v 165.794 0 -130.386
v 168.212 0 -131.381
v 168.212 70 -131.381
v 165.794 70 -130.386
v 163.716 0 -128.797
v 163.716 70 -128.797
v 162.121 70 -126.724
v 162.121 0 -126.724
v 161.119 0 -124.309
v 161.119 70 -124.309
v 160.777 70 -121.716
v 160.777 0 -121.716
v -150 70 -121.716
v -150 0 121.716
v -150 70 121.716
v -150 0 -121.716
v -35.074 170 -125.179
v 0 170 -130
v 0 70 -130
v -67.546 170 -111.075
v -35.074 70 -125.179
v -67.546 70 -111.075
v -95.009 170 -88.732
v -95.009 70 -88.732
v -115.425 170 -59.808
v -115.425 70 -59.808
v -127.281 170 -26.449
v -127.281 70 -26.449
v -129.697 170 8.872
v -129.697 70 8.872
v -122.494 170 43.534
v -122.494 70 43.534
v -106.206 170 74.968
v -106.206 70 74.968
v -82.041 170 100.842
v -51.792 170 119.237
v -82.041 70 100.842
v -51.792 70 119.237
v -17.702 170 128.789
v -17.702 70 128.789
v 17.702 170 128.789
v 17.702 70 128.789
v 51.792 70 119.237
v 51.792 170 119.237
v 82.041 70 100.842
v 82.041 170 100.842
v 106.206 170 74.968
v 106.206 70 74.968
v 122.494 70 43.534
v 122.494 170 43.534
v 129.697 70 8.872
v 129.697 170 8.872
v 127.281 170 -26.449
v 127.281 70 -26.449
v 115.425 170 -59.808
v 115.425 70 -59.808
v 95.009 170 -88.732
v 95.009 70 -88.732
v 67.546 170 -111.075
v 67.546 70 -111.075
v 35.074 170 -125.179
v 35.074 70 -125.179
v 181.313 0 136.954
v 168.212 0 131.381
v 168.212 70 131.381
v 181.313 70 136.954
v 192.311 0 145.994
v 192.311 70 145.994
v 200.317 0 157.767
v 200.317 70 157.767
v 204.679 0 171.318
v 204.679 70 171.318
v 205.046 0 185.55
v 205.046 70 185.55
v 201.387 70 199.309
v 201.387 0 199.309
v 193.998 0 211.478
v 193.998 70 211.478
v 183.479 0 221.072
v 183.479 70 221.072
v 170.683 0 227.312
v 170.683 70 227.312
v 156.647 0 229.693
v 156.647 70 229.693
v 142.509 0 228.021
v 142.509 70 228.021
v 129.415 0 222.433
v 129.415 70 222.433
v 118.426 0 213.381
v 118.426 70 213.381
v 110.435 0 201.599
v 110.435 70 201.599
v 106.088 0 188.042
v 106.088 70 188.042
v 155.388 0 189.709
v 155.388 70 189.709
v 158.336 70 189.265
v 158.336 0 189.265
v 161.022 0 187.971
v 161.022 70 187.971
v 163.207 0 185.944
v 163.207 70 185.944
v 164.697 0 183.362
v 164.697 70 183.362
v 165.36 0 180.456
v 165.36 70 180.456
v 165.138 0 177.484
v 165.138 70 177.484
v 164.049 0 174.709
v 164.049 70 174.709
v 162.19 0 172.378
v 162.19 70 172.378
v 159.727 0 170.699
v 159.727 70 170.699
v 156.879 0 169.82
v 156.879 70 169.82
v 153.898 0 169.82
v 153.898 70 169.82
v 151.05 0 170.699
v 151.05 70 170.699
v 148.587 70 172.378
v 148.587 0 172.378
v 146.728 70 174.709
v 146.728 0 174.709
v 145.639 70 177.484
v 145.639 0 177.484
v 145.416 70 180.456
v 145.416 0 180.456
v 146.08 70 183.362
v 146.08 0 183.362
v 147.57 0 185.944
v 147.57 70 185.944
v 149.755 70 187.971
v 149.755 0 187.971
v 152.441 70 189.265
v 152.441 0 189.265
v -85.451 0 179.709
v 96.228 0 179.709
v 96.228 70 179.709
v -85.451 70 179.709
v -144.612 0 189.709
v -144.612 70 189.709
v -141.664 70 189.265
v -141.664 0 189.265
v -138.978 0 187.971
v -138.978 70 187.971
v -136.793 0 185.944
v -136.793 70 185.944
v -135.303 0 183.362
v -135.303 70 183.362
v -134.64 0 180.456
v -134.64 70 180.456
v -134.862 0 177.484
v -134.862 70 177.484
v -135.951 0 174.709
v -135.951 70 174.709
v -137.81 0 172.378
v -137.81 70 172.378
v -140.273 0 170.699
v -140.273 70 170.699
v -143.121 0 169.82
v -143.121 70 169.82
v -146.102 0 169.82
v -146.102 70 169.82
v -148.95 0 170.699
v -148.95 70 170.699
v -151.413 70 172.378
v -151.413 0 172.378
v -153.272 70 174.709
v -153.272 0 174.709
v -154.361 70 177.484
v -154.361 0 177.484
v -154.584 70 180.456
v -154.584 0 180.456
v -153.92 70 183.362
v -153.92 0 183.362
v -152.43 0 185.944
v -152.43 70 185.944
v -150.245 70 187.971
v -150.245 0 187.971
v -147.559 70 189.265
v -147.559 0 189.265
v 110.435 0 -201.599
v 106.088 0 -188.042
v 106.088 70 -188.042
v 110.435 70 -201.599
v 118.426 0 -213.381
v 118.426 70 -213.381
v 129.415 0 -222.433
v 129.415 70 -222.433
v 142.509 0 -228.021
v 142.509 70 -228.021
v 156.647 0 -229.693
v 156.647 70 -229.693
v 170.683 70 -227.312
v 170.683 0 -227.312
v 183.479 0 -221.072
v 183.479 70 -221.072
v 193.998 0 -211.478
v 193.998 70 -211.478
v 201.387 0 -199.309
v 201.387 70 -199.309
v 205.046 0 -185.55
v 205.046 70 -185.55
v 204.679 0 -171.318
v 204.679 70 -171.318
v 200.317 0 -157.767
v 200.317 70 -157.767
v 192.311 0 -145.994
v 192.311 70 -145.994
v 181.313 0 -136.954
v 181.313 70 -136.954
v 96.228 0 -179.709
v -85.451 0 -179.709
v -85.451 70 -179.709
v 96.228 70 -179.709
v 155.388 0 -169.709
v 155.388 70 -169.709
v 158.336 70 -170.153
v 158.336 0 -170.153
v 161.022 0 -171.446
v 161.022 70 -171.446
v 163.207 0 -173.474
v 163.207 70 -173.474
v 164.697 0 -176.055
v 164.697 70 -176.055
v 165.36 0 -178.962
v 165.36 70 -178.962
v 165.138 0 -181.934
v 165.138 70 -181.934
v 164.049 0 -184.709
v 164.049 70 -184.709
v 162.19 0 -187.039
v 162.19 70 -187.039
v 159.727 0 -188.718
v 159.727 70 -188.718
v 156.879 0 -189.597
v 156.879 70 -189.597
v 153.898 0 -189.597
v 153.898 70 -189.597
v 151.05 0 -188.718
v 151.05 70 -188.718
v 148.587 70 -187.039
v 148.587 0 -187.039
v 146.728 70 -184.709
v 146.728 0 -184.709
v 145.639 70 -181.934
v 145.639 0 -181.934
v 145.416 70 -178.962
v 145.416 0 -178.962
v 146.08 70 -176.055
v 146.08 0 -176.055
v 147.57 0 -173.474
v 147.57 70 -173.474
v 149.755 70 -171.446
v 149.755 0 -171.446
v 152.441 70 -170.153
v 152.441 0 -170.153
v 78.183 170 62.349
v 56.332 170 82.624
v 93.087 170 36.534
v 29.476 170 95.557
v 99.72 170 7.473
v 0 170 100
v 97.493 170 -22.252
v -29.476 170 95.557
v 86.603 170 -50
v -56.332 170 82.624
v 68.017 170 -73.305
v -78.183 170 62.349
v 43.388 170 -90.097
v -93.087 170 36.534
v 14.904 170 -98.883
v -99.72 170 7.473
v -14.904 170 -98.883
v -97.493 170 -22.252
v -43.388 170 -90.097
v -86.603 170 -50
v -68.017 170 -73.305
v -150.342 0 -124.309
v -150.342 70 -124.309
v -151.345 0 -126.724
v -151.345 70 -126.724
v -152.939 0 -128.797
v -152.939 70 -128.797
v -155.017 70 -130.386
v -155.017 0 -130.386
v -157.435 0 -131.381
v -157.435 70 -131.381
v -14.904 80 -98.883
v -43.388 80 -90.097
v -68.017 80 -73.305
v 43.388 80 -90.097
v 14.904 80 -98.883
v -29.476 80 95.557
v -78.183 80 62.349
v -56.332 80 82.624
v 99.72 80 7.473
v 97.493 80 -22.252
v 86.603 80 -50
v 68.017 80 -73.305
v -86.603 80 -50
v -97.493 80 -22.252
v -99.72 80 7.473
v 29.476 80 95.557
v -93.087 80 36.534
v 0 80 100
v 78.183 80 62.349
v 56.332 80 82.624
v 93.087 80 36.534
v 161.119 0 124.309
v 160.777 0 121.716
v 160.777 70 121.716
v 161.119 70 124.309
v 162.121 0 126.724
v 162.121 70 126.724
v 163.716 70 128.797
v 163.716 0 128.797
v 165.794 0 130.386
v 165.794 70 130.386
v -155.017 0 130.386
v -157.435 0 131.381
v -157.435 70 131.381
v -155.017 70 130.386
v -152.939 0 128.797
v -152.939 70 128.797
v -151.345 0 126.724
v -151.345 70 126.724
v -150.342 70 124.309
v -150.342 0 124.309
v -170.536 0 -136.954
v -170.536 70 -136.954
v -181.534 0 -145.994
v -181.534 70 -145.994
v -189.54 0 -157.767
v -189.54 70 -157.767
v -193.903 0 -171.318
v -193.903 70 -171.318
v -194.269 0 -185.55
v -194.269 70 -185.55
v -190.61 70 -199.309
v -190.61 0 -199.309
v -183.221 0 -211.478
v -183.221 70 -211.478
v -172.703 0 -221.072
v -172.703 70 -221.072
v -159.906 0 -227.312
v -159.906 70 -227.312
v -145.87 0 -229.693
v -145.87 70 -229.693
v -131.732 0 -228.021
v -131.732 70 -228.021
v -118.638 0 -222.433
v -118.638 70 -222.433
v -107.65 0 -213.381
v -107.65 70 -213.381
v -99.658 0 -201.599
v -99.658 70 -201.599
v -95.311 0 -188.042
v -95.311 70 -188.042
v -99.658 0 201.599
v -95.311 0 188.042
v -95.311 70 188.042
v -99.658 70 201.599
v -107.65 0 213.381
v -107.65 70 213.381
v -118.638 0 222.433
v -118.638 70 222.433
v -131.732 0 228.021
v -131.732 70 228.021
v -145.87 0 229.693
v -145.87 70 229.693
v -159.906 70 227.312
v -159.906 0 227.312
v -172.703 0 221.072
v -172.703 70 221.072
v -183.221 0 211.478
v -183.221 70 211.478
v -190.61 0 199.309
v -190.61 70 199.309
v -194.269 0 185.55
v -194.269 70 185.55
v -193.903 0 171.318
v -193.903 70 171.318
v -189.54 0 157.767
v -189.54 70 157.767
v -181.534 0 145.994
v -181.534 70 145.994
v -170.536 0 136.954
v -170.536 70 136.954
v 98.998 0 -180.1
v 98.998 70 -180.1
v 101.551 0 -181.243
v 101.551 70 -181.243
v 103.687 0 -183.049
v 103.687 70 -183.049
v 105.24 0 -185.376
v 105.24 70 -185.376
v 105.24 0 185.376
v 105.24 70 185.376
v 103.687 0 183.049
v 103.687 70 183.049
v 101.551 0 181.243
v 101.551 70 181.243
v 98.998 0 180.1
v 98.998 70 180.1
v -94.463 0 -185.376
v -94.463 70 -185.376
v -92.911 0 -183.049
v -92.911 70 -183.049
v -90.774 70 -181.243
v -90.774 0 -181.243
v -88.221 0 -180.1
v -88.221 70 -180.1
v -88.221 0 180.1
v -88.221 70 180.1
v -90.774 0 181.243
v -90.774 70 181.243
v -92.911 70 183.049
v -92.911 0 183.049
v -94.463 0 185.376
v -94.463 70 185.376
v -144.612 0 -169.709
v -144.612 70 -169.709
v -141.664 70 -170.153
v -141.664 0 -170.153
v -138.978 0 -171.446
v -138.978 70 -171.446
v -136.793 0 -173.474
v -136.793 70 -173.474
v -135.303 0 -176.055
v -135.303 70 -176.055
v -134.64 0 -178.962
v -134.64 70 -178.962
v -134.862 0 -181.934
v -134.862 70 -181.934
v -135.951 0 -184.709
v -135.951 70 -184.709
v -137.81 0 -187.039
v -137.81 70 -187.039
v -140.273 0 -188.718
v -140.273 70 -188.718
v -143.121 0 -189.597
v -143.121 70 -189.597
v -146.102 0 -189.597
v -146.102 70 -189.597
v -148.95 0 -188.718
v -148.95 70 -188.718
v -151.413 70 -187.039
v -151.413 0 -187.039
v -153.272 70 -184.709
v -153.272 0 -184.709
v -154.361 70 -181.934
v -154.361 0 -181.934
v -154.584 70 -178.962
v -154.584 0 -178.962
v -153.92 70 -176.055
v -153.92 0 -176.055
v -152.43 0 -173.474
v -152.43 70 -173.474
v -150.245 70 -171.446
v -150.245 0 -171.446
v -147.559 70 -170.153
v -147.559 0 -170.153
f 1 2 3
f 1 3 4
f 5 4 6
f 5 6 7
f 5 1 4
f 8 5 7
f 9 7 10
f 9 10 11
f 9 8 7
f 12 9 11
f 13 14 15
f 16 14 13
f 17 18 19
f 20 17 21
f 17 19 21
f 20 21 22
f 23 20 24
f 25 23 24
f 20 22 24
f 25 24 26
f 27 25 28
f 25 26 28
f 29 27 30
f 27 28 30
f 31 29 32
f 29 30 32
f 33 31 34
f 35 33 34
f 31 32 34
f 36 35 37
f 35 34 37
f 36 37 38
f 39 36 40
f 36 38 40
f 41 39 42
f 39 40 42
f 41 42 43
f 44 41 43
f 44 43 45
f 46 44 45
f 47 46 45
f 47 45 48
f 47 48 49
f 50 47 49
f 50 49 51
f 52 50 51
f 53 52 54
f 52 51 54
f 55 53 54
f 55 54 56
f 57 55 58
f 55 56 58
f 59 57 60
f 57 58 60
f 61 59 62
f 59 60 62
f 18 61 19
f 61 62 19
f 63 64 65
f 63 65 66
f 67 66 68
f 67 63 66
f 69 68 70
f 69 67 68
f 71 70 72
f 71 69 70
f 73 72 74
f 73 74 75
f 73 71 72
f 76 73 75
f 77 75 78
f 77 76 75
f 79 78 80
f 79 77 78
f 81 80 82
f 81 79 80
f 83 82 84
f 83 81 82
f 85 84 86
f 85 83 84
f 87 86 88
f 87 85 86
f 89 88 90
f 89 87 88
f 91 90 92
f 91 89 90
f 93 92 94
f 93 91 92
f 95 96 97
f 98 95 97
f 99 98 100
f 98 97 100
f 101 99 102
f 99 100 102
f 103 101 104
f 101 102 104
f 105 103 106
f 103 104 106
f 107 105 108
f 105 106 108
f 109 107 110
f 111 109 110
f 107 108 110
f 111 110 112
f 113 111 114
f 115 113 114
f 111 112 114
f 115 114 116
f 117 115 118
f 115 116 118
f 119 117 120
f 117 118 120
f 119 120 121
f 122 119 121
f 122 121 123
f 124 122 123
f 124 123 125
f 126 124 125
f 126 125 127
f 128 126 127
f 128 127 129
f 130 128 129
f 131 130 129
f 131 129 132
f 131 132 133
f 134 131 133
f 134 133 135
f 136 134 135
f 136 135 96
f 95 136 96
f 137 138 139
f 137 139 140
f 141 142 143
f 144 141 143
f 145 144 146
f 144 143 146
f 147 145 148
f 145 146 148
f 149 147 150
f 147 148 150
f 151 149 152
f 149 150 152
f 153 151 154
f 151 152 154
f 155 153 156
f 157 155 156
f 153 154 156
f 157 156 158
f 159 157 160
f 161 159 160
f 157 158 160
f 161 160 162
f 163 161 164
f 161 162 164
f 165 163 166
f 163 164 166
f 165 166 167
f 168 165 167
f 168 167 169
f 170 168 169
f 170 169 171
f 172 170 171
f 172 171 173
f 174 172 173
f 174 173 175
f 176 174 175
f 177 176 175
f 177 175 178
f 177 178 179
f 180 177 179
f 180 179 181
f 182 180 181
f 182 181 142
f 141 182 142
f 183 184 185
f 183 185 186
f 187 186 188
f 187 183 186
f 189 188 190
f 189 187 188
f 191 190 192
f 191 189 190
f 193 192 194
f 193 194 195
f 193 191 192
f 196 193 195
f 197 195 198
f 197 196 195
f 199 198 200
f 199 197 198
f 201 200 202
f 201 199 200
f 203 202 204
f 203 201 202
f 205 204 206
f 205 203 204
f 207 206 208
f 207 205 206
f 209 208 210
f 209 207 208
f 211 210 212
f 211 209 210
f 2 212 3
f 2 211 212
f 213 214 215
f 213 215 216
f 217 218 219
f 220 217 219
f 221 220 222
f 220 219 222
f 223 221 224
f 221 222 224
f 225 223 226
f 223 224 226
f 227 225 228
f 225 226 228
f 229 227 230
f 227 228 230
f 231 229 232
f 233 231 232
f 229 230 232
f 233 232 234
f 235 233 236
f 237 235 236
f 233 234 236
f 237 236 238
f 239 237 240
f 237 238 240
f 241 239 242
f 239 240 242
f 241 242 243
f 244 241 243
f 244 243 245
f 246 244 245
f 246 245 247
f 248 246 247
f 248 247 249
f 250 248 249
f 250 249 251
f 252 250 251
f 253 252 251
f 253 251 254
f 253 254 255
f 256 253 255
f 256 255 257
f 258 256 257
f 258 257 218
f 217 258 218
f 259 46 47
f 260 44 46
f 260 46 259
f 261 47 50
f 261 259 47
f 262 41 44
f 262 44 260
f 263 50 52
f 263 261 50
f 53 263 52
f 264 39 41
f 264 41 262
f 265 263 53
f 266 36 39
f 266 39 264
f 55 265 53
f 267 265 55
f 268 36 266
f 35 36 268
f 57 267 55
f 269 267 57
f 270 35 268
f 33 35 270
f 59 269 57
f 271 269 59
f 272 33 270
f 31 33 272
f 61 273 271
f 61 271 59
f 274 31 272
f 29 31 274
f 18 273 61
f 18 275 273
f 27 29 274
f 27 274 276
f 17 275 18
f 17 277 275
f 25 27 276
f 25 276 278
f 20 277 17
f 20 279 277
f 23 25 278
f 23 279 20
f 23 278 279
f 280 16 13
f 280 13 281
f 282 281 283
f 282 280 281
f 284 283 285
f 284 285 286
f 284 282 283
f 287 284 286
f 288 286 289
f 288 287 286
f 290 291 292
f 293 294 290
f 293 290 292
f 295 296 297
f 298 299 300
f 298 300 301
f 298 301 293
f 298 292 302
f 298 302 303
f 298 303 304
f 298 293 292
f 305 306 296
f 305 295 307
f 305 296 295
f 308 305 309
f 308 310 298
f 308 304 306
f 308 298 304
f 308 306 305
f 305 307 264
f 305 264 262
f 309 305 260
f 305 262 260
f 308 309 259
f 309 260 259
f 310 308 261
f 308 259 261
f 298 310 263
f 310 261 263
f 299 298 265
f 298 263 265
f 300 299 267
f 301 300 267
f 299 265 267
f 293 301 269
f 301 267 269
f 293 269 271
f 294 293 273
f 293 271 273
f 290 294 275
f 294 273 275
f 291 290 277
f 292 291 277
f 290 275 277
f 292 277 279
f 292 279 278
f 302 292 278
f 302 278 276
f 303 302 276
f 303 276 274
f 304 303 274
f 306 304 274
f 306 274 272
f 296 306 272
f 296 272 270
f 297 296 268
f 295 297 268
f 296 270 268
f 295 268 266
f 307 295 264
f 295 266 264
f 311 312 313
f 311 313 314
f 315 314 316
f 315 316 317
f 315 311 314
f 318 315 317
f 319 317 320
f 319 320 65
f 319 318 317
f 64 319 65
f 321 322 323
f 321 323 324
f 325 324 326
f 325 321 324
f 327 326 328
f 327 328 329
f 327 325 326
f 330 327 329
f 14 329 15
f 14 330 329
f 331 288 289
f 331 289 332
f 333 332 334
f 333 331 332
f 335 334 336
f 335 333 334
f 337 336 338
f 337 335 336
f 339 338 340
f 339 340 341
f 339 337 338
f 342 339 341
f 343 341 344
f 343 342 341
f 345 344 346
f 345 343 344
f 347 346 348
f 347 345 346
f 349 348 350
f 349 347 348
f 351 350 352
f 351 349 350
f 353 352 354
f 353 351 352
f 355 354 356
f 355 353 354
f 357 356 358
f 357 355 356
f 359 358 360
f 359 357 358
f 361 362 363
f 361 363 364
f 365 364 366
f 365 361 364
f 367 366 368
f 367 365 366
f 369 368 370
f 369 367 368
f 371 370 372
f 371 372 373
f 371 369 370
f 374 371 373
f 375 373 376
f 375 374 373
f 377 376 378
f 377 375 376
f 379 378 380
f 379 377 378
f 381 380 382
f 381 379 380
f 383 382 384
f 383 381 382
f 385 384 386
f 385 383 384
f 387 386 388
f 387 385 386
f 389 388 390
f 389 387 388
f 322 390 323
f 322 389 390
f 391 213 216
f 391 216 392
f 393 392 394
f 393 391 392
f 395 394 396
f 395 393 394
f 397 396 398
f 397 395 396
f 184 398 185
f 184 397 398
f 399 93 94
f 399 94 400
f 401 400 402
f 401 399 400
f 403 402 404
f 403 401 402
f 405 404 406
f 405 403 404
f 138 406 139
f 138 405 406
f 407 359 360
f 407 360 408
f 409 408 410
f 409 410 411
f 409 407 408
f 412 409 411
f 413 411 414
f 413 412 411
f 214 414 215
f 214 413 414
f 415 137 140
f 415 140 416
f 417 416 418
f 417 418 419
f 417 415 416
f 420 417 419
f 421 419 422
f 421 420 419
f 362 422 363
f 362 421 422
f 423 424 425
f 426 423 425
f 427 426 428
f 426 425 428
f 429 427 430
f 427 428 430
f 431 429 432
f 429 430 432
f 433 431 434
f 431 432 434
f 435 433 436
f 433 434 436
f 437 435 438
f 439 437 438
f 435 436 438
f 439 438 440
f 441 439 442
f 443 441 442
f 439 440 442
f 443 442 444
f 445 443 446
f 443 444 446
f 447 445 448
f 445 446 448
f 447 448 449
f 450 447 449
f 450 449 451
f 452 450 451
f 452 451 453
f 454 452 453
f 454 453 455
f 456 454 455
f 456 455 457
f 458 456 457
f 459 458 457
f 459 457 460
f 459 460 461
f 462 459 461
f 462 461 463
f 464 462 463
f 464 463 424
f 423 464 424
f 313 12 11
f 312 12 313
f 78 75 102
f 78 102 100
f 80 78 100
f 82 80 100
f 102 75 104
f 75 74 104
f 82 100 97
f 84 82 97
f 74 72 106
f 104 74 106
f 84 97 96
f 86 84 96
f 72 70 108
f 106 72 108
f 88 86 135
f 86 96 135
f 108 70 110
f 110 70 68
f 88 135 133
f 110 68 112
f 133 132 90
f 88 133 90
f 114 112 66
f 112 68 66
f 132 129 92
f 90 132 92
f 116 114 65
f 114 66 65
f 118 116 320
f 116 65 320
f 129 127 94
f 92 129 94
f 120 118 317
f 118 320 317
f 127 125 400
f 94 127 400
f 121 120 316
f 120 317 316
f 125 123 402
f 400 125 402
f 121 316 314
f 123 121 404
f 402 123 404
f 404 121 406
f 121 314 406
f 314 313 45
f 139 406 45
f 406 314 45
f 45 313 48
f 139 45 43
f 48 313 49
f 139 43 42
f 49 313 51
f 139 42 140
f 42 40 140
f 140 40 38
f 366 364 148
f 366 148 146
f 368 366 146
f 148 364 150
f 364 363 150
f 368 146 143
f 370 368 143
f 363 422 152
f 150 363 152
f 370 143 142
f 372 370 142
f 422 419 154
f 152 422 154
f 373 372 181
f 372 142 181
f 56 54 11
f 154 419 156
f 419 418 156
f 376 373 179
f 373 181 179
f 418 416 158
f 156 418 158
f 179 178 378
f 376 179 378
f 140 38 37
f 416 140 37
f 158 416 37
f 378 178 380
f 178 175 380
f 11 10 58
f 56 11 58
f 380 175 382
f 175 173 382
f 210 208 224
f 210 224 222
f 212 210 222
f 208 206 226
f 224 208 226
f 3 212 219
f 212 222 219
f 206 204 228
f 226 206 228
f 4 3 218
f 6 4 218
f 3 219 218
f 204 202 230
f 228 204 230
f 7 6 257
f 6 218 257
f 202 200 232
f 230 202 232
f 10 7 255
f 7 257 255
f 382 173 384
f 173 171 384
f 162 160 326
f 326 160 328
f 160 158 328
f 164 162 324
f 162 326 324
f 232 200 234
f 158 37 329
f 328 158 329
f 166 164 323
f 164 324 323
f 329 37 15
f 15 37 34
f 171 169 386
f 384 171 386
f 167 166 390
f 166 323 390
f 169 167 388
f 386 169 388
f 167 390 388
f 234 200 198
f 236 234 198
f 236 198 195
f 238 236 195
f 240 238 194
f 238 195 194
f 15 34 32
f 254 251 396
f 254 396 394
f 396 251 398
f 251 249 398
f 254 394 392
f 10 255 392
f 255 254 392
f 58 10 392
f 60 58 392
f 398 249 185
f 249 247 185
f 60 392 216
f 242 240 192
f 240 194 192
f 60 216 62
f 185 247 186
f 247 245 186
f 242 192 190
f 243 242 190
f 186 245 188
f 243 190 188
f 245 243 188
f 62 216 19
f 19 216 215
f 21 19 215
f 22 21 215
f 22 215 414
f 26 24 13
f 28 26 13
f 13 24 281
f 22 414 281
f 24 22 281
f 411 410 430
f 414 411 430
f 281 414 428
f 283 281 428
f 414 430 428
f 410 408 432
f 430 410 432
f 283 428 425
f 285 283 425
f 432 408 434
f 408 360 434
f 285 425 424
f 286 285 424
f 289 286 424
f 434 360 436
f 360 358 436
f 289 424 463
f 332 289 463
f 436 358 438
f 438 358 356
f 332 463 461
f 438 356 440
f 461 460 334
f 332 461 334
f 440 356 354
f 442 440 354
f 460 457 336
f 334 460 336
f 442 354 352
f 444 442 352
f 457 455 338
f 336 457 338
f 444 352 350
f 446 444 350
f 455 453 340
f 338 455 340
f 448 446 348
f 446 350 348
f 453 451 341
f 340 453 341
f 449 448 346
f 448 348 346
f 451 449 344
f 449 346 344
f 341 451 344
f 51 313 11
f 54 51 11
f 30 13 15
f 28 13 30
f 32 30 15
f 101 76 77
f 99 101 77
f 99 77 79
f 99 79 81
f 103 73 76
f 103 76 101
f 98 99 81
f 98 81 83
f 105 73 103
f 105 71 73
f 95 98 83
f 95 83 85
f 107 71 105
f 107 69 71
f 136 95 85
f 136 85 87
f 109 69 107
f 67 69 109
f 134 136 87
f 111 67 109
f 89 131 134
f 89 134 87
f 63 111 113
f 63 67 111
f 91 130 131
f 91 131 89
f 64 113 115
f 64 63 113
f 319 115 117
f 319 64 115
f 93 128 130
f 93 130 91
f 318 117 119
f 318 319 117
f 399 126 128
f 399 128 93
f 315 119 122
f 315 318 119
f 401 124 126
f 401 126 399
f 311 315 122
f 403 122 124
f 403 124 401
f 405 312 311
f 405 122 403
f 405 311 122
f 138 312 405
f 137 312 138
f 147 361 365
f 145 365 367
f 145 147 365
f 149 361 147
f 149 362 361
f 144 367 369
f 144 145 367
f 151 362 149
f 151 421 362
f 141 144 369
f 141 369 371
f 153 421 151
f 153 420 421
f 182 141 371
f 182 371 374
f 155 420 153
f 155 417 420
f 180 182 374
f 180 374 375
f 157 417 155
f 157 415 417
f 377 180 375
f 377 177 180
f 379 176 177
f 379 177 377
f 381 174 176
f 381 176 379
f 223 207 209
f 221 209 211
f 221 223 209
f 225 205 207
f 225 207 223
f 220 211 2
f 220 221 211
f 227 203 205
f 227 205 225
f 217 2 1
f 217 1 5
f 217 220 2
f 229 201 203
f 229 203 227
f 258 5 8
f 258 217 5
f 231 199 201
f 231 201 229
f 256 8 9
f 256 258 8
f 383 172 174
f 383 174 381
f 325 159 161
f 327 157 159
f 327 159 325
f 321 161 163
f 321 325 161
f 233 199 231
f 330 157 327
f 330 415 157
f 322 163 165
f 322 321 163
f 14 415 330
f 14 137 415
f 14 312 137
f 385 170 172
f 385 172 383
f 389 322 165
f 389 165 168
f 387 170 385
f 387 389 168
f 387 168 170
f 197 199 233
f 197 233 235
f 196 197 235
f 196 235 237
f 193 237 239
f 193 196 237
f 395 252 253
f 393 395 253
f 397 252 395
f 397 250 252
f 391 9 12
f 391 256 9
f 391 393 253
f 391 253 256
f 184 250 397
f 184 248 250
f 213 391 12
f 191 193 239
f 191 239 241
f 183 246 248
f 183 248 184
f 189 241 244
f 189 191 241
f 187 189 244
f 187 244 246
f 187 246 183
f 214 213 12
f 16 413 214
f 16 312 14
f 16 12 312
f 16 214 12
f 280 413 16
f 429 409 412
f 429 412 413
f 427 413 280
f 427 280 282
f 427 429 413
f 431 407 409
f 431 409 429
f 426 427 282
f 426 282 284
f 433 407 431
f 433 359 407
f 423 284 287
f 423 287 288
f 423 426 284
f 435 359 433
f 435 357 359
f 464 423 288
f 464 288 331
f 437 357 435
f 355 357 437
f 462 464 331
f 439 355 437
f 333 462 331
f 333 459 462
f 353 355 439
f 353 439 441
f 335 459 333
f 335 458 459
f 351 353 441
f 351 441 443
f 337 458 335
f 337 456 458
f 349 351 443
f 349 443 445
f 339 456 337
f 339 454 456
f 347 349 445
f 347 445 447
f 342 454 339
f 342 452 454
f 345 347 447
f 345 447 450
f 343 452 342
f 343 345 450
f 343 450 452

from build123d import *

# Parameters (mm, degrees)
BOSS_EXTRUDE1_DEPTH = 70
SKETCH2_R           = 130
BOSS_EXTRUDE2_DEPTH = 100
SKETCH5_R           = 10
CUT_EXTRUDE1_DEPTH  = 324.960703978
SKETCH6_R           = 100
CUT_EXTRUDE2_DEPTH  = 90


with BuildPart() as part:
    # Sketch1 → Boss-Extrude1 (new body)
    with BuildSketch(Plane(origin=(0, 0, 0), x_dir=(1, 0, 0), z_dir=(0, 1, 0))):
        with BuildLine():
            Line((-85.450778727, 179.708800959), (96.227625611, 179.708800959))
            ThreePointArc((96.227625611, 179.708800959), (102.682597854, 182.071174801), (106.087758582, 188.042134293))
            ThreePointArc((106.087758582, 188.042134293), (189.081994137, 216.651233118), (168.212109643, 131.381240787))
            ThreePointArc((168.212109643, 131.381240787), (162.850707457, 127.812966963), (160.776846883, 121.715728753))
            Line((160.776846883, 121.715728753), (160.776846883, -121.715728753))
            ThreePointArc((160.776846883, -121.715728753), (162.850707457, -127.812966963), (168.212109643, -131.381240787))
            ThreePointArc((168.212109643, -131.381240787), (189.081994137, -216.651233118), (106.087758582, -188.042134293))
            ThreePointArc((106.087758582, -188.042134293), (102.682597854, -182.071174801), (96.227625611, -179.708800959))
            Line((96.227625611, -179.708800959), (-85.450778727, -179.708800959))
            ThreePointArc((-85.450778727, -179.708800959), (-91.905750971, -182.071174801), (-95.310911699, -188.042134293))
            ThreePointArc((-95.310911699, -188.042134293), (-178.305147254, -216.651233118), (-157.43526276, -131.381240787))
            ThreePointArc((-157.43526276, -131.381240787), (-152.073860574, -127.812966963), (-150, -121.715728753))
            Line((-150, -121.715728753), (-150, 121.715728753))
            ThreePointArc((-150, 121.715728753), (-152.073860574, 127.812966963), (-157.43526276, 131.381240787))
            ThreePointArc((-157.43526276, 131.381240787), (-178.305147254, 216.651233118), (-95.310911699, 188.042134293))
            ThreePointArc((-95.310911699, 188.042134293), (-91.905750971, 182.071174801), (-85.450778727, 179.708800959))
        make_face()
    extrude(amount=BOSS_EXTRUDE1_DEPTH)

    # Sketch2 → Boss-Extrude2 (add)
    with BuildSketch(Plane(origin=(0, 70, 0), x_dir=(1, 0, 0), z_dir=(0, 1, 0))):
        with Locations(Location((0, 0, 0), (0, 0, 90))):
            Circle(SKETCH2_R)
    extrude(amount=BOSS_EXTRUDE2_DEPTH)

    # Sketch5 → Cut-Extrude1 (cut, through all)
    with BuildSketch(Plane(origin=(0, 70, 0), x_dir=(1, 0, 0), z_dir=(0, 1, 0))):
        with Locations(Location((-144.611576558, -179.708800959, 0), (0, 0, 270))):
            Circle(SKETCH5_R)
        with Locations(Location((-144.611576558, 179.708800959, 0), (0, 0, 270))):
            Circle(SKETCH5_R)
        with Locations(Location((155.388423442, -179.708800959, 0), (0, 0, 270))):
            Circle(SKETCH5_R)
        with Locations(Location((155.388423442, 179.708800959, 0), (0, 0, 270))):
            Circle(SKETCH5_R)
    extrude(amount=-CUT_EXTRUDE1_DEPTH, mode=Mode.SUBTRACT)

    # Sketch6 → Cut-Extrude2 (cut)
    with BuildSketch(Plane(origin=(0, 170, 0), x_dir=(1, 0, 0), z_dir=(0, 1, 0))):
        with Locations(Location((0, 0, 0), (0, 0, 270))):
            Circle(SKETCH6_R)
    extrude(amount=-CUT_EXTRUDE2_DEPTH, mode=Mode.SUBTRACT)


solid = part.part
